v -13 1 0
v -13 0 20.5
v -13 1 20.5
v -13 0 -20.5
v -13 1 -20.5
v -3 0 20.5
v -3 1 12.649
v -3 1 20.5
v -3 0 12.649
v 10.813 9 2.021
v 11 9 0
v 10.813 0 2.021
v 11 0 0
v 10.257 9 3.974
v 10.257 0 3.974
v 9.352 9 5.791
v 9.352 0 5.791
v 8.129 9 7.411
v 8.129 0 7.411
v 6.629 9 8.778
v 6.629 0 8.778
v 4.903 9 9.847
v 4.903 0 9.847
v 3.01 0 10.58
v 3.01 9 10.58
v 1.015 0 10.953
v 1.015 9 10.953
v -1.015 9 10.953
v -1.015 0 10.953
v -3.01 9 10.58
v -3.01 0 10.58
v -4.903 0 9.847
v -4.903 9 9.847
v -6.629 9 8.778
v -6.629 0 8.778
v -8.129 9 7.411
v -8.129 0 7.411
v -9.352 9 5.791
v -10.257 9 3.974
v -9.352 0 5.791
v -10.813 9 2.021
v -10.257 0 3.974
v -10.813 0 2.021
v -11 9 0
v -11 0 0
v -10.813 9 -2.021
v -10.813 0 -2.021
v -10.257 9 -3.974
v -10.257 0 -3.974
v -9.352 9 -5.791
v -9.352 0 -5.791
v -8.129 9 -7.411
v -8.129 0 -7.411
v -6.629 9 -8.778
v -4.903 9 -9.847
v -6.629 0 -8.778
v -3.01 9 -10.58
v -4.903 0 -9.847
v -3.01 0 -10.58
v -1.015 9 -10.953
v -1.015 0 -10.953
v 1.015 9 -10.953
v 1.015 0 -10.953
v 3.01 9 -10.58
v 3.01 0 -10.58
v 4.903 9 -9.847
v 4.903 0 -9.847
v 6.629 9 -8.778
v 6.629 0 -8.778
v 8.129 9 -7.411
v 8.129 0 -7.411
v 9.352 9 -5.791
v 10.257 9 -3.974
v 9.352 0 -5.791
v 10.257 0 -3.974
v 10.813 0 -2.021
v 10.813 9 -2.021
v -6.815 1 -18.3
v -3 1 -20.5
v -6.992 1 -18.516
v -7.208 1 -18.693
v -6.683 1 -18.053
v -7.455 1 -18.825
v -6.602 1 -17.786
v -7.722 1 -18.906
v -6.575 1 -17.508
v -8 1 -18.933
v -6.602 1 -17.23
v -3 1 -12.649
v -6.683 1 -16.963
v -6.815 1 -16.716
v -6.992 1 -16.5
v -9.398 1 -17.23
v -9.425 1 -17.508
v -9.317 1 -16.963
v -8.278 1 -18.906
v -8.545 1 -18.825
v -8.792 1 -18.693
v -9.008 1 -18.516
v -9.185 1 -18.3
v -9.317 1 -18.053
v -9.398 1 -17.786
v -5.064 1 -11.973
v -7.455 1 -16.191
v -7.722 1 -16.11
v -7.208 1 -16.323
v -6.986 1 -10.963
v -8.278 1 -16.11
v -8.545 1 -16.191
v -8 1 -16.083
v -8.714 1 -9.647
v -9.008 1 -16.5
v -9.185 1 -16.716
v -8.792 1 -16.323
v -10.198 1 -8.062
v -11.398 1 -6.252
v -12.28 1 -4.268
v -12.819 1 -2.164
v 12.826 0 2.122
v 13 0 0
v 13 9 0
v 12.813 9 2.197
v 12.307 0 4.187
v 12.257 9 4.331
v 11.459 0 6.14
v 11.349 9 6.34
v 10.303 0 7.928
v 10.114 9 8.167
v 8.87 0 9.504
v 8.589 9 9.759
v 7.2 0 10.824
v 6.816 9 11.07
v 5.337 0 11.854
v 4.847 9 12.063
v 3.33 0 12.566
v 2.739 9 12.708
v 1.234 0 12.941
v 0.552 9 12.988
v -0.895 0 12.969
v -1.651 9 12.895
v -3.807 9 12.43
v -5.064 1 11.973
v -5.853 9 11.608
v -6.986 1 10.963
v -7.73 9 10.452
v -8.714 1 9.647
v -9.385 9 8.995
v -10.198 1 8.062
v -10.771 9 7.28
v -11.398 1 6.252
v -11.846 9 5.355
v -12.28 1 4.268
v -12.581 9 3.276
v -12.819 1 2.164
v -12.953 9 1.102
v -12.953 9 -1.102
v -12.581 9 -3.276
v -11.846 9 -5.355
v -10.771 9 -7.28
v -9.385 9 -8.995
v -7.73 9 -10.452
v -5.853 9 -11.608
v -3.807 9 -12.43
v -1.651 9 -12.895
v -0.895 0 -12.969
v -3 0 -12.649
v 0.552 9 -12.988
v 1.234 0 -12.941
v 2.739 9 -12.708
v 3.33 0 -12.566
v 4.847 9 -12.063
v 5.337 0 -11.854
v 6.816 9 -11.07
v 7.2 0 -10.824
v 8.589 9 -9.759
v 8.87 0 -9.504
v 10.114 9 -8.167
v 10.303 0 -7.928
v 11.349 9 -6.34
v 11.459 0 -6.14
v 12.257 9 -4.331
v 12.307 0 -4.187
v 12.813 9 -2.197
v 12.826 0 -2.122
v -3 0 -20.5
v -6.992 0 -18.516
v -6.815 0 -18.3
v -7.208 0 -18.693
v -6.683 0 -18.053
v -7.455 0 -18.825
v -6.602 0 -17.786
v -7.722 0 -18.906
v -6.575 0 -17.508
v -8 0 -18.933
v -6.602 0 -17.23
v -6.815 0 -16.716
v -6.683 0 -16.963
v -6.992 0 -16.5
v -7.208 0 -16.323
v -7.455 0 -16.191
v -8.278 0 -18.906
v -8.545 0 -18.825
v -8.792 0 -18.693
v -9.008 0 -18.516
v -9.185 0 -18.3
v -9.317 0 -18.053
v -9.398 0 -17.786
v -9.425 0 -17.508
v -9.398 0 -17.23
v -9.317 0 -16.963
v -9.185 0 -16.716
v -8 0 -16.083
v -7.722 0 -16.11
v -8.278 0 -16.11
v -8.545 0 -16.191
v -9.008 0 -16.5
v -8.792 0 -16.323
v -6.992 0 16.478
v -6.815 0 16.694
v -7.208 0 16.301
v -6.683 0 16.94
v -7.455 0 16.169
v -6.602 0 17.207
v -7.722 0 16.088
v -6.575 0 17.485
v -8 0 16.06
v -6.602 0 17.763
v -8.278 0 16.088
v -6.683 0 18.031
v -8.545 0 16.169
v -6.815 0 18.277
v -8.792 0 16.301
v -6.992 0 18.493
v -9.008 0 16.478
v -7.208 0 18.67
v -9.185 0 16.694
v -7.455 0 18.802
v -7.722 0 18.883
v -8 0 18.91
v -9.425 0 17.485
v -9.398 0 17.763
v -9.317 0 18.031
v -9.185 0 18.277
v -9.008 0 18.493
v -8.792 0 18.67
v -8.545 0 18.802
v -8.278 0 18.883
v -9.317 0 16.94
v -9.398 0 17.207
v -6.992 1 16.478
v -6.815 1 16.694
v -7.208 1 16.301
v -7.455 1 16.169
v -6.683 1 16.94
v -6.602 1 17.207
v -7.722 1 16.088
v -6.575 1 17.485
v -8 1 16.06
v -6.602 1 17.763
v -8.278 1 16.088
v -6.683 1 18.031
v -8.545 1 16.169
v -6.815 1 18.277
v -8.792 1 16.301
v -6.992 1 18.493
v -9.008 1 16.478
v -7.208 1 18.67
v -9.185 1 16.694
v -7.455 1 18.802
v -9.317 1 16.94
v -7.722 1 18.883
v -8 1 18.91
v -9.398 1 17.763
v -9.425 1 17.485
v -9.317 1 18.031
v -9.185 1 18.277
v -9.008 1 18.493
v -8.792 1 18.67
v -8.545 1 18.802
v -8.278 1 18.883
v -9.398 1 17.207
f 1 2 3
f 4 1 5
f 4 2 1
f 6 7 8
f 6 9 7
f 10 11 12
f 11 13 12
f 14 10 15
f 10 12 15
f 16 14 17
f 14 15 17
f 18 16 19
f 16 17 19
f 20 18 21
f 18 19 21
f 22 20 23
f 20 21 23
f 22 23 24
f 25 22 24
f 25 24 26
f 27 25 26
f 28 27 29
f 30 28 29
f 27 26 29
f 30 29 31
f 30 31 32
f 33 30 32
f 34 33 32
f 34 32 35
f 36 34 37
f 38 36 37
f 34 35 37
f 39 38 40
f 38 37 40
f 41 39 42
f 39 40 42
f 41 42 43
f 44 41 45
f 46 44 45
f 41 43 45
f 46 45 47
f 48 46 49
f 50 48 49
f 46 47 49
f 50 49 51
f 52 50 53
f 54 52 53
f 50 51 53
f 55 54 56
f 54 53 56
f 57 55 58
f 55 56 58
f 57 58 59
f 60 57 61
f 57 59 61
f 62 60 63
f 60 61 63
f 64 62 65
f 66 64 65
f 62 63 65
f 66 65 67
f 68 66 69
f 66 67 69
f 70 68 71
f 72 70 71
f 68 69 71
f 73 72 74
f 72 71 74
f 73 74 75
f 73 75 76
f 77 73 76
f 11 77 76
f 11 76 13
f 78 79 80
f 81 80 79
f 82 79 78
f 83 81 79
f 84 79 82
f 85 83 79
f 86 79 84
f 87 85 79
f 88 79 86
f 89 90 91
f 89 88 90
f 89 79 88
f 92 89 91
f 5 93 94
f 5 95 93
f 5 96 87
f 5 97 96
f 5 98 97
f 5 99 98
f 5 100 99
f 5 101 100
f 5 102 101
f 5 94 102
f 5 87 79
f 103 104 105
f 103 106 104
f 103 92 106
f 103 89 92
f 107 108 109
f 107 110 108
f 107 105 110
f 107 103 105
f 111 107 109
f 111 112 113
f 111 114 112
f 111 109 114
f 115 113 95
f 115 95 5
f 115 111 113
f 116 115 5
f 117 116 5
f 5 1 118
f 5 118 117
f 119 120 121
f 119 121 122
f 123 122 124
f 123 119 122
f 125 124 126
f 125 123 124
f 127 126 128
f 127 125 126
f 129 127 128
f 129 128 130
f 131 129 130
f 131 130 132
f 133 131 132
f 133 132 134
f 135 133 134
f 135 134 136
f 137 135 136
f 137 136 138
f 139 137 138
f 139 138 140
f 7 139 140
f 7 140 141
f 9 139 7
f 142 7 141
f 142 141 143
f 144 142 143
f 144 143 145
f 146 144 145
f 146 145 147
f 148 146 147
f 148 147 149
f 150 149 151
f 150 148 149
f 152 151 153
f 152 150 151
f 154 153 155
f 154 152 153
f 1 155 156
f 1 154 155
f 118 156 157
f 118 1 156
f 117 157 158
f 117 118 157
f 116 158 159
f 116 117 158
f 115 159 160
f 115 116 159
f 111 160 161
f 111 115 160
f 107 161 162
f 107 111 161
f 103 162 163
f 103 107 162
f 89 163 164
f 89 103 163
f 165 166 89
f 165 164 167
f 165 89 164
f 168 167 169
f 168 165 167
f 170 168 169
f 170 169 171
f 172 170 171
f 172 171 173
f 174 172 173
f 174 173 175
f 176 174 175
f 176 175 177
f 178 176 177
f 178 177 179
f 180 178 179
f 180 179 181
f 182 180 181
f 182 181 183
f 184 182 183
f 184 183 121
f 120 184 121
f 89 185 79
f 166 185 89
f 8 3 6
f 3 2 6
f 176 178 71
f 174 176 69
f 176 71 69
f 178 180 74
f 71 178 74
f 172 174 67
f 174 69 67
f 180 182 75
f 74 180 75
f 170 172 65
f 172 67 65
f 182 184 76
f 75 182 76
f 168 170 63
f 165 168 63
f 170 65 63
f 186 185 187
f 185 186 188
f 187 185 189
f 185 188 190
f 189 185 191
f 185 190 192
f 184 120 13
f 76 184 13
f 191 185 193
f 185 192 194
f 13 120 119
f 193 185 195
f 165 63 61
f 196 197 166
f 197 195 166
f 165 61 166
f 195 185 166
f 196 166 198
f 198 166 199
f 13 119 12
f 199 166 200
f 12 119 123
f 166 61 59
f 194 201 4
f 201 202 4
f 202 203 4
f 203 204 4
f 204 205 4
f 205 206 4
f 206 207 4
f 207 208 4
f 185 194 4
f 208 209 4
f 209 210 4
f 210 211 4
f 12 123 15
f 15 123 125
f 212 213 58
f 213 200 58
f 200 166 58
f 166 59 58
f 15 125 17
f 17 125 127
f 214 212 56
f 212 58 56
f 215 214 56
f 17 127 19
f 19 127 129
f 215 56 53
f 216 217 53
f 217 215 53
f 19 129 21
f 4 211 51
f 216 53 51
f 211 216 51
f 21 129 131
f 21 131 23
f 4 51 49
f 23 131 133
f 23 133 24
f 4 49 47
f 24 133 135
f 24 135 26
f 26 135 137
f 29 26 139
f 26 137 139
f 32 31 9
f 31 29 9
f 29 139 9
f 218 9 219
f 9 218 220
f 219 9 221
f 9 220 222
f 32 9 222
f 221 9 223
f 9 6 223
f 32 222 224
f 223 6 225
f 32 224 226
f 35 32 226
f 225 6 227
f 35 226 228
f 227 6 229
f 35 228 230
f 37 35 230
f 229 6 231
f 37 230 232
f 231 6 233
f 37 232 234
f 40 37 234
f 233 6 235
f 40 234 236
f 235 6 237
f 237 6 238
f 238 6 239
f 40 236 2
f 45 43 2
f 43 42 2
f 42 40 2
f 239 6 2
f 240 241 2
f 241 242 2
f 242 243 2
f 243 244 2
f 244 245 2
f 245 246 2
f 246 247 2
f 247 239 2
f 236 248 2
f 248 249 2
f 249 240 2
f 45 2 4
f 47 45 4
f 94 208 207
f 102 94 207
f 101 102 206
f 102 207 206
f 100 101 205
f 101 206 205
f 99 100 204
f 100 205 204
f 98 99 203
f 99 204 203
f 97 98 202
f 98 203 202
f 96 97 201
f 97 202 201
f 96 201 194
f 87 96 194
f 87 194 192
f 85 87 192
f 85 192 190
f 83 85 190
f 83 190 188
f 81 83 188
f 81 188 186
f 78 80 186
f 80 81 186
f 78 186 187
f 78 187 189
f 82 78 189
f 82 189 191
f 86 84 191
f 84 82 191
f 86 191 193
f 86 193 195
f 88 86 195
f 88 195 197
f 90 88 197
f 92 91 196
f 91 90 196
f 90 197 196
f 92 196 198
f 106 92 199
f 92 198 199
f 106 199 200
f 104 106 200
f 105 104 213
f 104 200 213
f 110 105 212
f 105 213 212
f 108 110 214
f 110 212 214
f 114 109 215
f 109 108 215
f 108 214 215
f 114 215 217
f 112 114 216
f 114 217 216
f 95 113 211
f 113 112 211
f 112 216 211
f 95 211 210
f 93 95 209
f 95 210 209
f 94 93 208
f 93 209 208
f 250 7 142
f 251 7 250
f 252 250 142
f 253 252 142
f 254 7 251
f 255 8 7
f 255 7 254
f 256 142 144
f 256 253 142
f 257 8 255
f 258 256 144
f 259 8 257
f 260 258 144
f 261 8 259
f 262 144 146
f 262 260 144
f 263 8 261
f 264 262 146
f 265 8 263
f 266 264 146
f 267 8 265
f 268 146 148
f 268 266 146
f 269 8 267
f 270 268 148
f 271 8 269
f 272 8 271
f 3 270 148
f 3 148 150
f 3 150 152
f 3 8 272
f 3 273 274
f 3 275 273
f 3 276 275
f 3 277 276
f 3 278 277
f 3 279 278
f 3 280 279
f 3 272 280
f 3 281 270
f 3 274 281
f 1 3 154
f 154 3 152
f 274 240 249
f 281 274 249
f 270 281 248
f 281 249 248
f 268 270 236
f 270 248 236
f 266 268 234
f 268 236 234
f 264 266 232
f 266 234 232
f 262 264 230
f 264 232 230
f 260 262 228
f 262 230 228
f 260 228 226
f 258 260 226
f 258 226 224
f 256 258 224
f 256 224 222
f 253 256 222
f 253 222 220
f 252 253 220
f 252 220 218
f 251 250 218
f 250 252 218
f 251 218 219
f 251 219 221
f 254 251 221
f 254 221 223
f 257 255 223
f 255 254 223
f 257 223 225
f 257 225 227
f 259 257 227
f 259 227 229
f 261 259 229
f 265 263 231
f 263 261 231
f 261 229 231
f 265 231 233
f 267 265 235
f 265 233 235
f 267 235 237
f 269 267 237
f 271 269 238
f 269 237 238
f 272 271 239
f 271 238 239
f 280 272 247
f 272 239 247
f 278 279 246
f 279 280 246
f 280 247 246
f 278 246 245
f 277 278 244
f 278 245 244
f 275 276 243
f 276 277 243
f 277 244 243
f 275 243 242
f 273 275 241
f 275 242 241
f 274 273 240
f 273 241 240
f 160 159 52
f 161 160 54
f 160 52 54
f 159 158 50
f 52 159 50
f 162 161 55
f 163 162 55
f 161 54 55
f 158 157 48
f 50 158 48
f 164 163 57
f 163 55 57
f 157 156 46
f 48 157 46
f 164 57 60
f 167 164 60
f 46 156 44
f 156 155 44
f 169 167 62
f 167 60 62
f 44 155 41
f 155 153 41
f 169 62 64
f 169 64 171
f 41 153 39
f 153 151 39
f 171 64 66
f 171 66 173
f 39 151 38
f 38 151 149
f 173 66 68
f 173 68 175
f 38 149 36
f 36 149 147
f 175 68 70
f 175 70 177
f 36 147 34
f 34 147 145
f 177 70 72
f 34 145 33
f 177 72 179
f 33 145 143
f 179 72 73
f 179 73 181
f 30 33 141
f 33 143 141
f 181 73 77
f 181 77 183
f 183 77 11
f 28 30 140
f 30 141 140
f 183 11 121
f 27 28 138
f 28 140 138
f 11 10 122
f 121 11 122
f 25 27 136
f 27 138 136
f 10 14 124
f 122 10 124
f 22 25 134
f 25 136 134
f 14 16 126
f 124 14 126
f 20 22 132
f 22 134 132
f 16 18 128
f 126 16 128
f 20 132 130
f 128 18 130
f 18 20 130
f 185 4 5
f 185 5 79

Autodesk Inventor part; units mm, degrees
ref_plane "YZ Plane" through (0, 0, 0) normal (1, 0, 0) x (0, 1, 0)
ref_plane "XZ Plane" through (0, 0, 0) normal (0, 1, 0) x (-1, 0, 0)
ref_plane "XY Plane" through (0, 0, 0) normal (0, 0, 1) x (1, 0, 0)
sketch "Sketch3" plane through (0, 0, 0) normal (0, 1, 0) x (-1, 0, 0)
  line L0 (3, -20.5) -> (3, -14.5)
  line L1 (13, 20.5) -> (3, 20.5)
  line L2 (3, -20.5) -> (3, 20.5)
  line L3 (3, 20.5) -> (13, 20.5)
  line L4 (13, 20.5) -> (13, -20.5)
  line L5 (13, -20.5) -> (3, -20.5)
  line L6 (0, 0) -> (3, 0)
  line L7 (13, 14.5) -> (3, 14.5)
  line L8 (3, -14.5) -> (13, -14.5)
  line L9 (3, -14.5) -> (13, -14.5)
  line L10 (3, 14.5) -> (13, 14.5)
  circle A0 centre (8, -17.508) radius 1.425
  circle A1 centre (8, -17.508) radius 1.425
  circle A2 centre (8, 17.4854) radius 1.425
  circle A3 centre (8, 17.4854) radius 1.425
  point P0 (3, 20.5)
  dimension "d15" = 41
  dimension "d16" = 10
  dimension "d17" = 0
  dimension "d18" = 6
extrude "Extrusion1" add sketch "Sketch3" along normal blind 1
sketch "Sketch5" plane through (0, 0, 0) normal (0, -1, 0) x (1, 0, 0)
  line L0 (-3, 20.5) -> (-3, 14.5)
  line L1 (-13, -20.5) -> (-3, -20.5)
  line L2 (-3, 20.5) -> (-3, -20.5)
  line L3 (-3, -20.5) -> (-13, -20.5)
  line L4 (-13, -20.5) -> (-13, 20.5)
  line L5 (-13, 20.5) -> (-3, 20.5)
  line L6 (0, 0) -> (-3, 0)
  line L7 (-13, -14.5) -> (-3, -14.5)
  line L8 (-3, 14.5) -> (-13, 14.5)
  line L9 (-3, 14.5) -> (-13, 14.5)
  line L10 (-3, -14.5) -> (-13, -14.5)
  circle A0 centre (-8, 17.508) radius 1.425
  circle A1 centre (-8, 17.508) radius 1.425
  circle A2 centre (-8, -17.4854) radius 1.425
  circle A3 centre (-8, -17.4854) radius 1.425
  circle A4 centre (0, 0) radius 11
  circle A5 centre (0, 0) radius 13
  point P0 (3, 20.5)
  point P1 (3, -14.5)
  point P2 (-3, 12.6491)
  point P3 (-3, 10.583)
  point P4 (-3, -10.583)
  point P5 (-3, -12.6491)
  dimension "d27" = 41
  dimension "d28" = 10
  dimension "d29" = 0
  dimension "d30" = 6
  dimension "d31" = 22
  dimension "d32" = 26
extrude "Extrusion2" add sketch "Sketch5" against normal blind 9 contours A5 L2 A4 | L2 A4 A5
sketch "Sketch6" plane through (0, 9, 0) normal (0, 1, 0) x (1, 0, 0)
  circle A0 centre (0, 0) radius 11
extrude "Extrusion3" cut sketch "Sketch6" against normal through all
properties part number "Ball_Bearing_Holder"
